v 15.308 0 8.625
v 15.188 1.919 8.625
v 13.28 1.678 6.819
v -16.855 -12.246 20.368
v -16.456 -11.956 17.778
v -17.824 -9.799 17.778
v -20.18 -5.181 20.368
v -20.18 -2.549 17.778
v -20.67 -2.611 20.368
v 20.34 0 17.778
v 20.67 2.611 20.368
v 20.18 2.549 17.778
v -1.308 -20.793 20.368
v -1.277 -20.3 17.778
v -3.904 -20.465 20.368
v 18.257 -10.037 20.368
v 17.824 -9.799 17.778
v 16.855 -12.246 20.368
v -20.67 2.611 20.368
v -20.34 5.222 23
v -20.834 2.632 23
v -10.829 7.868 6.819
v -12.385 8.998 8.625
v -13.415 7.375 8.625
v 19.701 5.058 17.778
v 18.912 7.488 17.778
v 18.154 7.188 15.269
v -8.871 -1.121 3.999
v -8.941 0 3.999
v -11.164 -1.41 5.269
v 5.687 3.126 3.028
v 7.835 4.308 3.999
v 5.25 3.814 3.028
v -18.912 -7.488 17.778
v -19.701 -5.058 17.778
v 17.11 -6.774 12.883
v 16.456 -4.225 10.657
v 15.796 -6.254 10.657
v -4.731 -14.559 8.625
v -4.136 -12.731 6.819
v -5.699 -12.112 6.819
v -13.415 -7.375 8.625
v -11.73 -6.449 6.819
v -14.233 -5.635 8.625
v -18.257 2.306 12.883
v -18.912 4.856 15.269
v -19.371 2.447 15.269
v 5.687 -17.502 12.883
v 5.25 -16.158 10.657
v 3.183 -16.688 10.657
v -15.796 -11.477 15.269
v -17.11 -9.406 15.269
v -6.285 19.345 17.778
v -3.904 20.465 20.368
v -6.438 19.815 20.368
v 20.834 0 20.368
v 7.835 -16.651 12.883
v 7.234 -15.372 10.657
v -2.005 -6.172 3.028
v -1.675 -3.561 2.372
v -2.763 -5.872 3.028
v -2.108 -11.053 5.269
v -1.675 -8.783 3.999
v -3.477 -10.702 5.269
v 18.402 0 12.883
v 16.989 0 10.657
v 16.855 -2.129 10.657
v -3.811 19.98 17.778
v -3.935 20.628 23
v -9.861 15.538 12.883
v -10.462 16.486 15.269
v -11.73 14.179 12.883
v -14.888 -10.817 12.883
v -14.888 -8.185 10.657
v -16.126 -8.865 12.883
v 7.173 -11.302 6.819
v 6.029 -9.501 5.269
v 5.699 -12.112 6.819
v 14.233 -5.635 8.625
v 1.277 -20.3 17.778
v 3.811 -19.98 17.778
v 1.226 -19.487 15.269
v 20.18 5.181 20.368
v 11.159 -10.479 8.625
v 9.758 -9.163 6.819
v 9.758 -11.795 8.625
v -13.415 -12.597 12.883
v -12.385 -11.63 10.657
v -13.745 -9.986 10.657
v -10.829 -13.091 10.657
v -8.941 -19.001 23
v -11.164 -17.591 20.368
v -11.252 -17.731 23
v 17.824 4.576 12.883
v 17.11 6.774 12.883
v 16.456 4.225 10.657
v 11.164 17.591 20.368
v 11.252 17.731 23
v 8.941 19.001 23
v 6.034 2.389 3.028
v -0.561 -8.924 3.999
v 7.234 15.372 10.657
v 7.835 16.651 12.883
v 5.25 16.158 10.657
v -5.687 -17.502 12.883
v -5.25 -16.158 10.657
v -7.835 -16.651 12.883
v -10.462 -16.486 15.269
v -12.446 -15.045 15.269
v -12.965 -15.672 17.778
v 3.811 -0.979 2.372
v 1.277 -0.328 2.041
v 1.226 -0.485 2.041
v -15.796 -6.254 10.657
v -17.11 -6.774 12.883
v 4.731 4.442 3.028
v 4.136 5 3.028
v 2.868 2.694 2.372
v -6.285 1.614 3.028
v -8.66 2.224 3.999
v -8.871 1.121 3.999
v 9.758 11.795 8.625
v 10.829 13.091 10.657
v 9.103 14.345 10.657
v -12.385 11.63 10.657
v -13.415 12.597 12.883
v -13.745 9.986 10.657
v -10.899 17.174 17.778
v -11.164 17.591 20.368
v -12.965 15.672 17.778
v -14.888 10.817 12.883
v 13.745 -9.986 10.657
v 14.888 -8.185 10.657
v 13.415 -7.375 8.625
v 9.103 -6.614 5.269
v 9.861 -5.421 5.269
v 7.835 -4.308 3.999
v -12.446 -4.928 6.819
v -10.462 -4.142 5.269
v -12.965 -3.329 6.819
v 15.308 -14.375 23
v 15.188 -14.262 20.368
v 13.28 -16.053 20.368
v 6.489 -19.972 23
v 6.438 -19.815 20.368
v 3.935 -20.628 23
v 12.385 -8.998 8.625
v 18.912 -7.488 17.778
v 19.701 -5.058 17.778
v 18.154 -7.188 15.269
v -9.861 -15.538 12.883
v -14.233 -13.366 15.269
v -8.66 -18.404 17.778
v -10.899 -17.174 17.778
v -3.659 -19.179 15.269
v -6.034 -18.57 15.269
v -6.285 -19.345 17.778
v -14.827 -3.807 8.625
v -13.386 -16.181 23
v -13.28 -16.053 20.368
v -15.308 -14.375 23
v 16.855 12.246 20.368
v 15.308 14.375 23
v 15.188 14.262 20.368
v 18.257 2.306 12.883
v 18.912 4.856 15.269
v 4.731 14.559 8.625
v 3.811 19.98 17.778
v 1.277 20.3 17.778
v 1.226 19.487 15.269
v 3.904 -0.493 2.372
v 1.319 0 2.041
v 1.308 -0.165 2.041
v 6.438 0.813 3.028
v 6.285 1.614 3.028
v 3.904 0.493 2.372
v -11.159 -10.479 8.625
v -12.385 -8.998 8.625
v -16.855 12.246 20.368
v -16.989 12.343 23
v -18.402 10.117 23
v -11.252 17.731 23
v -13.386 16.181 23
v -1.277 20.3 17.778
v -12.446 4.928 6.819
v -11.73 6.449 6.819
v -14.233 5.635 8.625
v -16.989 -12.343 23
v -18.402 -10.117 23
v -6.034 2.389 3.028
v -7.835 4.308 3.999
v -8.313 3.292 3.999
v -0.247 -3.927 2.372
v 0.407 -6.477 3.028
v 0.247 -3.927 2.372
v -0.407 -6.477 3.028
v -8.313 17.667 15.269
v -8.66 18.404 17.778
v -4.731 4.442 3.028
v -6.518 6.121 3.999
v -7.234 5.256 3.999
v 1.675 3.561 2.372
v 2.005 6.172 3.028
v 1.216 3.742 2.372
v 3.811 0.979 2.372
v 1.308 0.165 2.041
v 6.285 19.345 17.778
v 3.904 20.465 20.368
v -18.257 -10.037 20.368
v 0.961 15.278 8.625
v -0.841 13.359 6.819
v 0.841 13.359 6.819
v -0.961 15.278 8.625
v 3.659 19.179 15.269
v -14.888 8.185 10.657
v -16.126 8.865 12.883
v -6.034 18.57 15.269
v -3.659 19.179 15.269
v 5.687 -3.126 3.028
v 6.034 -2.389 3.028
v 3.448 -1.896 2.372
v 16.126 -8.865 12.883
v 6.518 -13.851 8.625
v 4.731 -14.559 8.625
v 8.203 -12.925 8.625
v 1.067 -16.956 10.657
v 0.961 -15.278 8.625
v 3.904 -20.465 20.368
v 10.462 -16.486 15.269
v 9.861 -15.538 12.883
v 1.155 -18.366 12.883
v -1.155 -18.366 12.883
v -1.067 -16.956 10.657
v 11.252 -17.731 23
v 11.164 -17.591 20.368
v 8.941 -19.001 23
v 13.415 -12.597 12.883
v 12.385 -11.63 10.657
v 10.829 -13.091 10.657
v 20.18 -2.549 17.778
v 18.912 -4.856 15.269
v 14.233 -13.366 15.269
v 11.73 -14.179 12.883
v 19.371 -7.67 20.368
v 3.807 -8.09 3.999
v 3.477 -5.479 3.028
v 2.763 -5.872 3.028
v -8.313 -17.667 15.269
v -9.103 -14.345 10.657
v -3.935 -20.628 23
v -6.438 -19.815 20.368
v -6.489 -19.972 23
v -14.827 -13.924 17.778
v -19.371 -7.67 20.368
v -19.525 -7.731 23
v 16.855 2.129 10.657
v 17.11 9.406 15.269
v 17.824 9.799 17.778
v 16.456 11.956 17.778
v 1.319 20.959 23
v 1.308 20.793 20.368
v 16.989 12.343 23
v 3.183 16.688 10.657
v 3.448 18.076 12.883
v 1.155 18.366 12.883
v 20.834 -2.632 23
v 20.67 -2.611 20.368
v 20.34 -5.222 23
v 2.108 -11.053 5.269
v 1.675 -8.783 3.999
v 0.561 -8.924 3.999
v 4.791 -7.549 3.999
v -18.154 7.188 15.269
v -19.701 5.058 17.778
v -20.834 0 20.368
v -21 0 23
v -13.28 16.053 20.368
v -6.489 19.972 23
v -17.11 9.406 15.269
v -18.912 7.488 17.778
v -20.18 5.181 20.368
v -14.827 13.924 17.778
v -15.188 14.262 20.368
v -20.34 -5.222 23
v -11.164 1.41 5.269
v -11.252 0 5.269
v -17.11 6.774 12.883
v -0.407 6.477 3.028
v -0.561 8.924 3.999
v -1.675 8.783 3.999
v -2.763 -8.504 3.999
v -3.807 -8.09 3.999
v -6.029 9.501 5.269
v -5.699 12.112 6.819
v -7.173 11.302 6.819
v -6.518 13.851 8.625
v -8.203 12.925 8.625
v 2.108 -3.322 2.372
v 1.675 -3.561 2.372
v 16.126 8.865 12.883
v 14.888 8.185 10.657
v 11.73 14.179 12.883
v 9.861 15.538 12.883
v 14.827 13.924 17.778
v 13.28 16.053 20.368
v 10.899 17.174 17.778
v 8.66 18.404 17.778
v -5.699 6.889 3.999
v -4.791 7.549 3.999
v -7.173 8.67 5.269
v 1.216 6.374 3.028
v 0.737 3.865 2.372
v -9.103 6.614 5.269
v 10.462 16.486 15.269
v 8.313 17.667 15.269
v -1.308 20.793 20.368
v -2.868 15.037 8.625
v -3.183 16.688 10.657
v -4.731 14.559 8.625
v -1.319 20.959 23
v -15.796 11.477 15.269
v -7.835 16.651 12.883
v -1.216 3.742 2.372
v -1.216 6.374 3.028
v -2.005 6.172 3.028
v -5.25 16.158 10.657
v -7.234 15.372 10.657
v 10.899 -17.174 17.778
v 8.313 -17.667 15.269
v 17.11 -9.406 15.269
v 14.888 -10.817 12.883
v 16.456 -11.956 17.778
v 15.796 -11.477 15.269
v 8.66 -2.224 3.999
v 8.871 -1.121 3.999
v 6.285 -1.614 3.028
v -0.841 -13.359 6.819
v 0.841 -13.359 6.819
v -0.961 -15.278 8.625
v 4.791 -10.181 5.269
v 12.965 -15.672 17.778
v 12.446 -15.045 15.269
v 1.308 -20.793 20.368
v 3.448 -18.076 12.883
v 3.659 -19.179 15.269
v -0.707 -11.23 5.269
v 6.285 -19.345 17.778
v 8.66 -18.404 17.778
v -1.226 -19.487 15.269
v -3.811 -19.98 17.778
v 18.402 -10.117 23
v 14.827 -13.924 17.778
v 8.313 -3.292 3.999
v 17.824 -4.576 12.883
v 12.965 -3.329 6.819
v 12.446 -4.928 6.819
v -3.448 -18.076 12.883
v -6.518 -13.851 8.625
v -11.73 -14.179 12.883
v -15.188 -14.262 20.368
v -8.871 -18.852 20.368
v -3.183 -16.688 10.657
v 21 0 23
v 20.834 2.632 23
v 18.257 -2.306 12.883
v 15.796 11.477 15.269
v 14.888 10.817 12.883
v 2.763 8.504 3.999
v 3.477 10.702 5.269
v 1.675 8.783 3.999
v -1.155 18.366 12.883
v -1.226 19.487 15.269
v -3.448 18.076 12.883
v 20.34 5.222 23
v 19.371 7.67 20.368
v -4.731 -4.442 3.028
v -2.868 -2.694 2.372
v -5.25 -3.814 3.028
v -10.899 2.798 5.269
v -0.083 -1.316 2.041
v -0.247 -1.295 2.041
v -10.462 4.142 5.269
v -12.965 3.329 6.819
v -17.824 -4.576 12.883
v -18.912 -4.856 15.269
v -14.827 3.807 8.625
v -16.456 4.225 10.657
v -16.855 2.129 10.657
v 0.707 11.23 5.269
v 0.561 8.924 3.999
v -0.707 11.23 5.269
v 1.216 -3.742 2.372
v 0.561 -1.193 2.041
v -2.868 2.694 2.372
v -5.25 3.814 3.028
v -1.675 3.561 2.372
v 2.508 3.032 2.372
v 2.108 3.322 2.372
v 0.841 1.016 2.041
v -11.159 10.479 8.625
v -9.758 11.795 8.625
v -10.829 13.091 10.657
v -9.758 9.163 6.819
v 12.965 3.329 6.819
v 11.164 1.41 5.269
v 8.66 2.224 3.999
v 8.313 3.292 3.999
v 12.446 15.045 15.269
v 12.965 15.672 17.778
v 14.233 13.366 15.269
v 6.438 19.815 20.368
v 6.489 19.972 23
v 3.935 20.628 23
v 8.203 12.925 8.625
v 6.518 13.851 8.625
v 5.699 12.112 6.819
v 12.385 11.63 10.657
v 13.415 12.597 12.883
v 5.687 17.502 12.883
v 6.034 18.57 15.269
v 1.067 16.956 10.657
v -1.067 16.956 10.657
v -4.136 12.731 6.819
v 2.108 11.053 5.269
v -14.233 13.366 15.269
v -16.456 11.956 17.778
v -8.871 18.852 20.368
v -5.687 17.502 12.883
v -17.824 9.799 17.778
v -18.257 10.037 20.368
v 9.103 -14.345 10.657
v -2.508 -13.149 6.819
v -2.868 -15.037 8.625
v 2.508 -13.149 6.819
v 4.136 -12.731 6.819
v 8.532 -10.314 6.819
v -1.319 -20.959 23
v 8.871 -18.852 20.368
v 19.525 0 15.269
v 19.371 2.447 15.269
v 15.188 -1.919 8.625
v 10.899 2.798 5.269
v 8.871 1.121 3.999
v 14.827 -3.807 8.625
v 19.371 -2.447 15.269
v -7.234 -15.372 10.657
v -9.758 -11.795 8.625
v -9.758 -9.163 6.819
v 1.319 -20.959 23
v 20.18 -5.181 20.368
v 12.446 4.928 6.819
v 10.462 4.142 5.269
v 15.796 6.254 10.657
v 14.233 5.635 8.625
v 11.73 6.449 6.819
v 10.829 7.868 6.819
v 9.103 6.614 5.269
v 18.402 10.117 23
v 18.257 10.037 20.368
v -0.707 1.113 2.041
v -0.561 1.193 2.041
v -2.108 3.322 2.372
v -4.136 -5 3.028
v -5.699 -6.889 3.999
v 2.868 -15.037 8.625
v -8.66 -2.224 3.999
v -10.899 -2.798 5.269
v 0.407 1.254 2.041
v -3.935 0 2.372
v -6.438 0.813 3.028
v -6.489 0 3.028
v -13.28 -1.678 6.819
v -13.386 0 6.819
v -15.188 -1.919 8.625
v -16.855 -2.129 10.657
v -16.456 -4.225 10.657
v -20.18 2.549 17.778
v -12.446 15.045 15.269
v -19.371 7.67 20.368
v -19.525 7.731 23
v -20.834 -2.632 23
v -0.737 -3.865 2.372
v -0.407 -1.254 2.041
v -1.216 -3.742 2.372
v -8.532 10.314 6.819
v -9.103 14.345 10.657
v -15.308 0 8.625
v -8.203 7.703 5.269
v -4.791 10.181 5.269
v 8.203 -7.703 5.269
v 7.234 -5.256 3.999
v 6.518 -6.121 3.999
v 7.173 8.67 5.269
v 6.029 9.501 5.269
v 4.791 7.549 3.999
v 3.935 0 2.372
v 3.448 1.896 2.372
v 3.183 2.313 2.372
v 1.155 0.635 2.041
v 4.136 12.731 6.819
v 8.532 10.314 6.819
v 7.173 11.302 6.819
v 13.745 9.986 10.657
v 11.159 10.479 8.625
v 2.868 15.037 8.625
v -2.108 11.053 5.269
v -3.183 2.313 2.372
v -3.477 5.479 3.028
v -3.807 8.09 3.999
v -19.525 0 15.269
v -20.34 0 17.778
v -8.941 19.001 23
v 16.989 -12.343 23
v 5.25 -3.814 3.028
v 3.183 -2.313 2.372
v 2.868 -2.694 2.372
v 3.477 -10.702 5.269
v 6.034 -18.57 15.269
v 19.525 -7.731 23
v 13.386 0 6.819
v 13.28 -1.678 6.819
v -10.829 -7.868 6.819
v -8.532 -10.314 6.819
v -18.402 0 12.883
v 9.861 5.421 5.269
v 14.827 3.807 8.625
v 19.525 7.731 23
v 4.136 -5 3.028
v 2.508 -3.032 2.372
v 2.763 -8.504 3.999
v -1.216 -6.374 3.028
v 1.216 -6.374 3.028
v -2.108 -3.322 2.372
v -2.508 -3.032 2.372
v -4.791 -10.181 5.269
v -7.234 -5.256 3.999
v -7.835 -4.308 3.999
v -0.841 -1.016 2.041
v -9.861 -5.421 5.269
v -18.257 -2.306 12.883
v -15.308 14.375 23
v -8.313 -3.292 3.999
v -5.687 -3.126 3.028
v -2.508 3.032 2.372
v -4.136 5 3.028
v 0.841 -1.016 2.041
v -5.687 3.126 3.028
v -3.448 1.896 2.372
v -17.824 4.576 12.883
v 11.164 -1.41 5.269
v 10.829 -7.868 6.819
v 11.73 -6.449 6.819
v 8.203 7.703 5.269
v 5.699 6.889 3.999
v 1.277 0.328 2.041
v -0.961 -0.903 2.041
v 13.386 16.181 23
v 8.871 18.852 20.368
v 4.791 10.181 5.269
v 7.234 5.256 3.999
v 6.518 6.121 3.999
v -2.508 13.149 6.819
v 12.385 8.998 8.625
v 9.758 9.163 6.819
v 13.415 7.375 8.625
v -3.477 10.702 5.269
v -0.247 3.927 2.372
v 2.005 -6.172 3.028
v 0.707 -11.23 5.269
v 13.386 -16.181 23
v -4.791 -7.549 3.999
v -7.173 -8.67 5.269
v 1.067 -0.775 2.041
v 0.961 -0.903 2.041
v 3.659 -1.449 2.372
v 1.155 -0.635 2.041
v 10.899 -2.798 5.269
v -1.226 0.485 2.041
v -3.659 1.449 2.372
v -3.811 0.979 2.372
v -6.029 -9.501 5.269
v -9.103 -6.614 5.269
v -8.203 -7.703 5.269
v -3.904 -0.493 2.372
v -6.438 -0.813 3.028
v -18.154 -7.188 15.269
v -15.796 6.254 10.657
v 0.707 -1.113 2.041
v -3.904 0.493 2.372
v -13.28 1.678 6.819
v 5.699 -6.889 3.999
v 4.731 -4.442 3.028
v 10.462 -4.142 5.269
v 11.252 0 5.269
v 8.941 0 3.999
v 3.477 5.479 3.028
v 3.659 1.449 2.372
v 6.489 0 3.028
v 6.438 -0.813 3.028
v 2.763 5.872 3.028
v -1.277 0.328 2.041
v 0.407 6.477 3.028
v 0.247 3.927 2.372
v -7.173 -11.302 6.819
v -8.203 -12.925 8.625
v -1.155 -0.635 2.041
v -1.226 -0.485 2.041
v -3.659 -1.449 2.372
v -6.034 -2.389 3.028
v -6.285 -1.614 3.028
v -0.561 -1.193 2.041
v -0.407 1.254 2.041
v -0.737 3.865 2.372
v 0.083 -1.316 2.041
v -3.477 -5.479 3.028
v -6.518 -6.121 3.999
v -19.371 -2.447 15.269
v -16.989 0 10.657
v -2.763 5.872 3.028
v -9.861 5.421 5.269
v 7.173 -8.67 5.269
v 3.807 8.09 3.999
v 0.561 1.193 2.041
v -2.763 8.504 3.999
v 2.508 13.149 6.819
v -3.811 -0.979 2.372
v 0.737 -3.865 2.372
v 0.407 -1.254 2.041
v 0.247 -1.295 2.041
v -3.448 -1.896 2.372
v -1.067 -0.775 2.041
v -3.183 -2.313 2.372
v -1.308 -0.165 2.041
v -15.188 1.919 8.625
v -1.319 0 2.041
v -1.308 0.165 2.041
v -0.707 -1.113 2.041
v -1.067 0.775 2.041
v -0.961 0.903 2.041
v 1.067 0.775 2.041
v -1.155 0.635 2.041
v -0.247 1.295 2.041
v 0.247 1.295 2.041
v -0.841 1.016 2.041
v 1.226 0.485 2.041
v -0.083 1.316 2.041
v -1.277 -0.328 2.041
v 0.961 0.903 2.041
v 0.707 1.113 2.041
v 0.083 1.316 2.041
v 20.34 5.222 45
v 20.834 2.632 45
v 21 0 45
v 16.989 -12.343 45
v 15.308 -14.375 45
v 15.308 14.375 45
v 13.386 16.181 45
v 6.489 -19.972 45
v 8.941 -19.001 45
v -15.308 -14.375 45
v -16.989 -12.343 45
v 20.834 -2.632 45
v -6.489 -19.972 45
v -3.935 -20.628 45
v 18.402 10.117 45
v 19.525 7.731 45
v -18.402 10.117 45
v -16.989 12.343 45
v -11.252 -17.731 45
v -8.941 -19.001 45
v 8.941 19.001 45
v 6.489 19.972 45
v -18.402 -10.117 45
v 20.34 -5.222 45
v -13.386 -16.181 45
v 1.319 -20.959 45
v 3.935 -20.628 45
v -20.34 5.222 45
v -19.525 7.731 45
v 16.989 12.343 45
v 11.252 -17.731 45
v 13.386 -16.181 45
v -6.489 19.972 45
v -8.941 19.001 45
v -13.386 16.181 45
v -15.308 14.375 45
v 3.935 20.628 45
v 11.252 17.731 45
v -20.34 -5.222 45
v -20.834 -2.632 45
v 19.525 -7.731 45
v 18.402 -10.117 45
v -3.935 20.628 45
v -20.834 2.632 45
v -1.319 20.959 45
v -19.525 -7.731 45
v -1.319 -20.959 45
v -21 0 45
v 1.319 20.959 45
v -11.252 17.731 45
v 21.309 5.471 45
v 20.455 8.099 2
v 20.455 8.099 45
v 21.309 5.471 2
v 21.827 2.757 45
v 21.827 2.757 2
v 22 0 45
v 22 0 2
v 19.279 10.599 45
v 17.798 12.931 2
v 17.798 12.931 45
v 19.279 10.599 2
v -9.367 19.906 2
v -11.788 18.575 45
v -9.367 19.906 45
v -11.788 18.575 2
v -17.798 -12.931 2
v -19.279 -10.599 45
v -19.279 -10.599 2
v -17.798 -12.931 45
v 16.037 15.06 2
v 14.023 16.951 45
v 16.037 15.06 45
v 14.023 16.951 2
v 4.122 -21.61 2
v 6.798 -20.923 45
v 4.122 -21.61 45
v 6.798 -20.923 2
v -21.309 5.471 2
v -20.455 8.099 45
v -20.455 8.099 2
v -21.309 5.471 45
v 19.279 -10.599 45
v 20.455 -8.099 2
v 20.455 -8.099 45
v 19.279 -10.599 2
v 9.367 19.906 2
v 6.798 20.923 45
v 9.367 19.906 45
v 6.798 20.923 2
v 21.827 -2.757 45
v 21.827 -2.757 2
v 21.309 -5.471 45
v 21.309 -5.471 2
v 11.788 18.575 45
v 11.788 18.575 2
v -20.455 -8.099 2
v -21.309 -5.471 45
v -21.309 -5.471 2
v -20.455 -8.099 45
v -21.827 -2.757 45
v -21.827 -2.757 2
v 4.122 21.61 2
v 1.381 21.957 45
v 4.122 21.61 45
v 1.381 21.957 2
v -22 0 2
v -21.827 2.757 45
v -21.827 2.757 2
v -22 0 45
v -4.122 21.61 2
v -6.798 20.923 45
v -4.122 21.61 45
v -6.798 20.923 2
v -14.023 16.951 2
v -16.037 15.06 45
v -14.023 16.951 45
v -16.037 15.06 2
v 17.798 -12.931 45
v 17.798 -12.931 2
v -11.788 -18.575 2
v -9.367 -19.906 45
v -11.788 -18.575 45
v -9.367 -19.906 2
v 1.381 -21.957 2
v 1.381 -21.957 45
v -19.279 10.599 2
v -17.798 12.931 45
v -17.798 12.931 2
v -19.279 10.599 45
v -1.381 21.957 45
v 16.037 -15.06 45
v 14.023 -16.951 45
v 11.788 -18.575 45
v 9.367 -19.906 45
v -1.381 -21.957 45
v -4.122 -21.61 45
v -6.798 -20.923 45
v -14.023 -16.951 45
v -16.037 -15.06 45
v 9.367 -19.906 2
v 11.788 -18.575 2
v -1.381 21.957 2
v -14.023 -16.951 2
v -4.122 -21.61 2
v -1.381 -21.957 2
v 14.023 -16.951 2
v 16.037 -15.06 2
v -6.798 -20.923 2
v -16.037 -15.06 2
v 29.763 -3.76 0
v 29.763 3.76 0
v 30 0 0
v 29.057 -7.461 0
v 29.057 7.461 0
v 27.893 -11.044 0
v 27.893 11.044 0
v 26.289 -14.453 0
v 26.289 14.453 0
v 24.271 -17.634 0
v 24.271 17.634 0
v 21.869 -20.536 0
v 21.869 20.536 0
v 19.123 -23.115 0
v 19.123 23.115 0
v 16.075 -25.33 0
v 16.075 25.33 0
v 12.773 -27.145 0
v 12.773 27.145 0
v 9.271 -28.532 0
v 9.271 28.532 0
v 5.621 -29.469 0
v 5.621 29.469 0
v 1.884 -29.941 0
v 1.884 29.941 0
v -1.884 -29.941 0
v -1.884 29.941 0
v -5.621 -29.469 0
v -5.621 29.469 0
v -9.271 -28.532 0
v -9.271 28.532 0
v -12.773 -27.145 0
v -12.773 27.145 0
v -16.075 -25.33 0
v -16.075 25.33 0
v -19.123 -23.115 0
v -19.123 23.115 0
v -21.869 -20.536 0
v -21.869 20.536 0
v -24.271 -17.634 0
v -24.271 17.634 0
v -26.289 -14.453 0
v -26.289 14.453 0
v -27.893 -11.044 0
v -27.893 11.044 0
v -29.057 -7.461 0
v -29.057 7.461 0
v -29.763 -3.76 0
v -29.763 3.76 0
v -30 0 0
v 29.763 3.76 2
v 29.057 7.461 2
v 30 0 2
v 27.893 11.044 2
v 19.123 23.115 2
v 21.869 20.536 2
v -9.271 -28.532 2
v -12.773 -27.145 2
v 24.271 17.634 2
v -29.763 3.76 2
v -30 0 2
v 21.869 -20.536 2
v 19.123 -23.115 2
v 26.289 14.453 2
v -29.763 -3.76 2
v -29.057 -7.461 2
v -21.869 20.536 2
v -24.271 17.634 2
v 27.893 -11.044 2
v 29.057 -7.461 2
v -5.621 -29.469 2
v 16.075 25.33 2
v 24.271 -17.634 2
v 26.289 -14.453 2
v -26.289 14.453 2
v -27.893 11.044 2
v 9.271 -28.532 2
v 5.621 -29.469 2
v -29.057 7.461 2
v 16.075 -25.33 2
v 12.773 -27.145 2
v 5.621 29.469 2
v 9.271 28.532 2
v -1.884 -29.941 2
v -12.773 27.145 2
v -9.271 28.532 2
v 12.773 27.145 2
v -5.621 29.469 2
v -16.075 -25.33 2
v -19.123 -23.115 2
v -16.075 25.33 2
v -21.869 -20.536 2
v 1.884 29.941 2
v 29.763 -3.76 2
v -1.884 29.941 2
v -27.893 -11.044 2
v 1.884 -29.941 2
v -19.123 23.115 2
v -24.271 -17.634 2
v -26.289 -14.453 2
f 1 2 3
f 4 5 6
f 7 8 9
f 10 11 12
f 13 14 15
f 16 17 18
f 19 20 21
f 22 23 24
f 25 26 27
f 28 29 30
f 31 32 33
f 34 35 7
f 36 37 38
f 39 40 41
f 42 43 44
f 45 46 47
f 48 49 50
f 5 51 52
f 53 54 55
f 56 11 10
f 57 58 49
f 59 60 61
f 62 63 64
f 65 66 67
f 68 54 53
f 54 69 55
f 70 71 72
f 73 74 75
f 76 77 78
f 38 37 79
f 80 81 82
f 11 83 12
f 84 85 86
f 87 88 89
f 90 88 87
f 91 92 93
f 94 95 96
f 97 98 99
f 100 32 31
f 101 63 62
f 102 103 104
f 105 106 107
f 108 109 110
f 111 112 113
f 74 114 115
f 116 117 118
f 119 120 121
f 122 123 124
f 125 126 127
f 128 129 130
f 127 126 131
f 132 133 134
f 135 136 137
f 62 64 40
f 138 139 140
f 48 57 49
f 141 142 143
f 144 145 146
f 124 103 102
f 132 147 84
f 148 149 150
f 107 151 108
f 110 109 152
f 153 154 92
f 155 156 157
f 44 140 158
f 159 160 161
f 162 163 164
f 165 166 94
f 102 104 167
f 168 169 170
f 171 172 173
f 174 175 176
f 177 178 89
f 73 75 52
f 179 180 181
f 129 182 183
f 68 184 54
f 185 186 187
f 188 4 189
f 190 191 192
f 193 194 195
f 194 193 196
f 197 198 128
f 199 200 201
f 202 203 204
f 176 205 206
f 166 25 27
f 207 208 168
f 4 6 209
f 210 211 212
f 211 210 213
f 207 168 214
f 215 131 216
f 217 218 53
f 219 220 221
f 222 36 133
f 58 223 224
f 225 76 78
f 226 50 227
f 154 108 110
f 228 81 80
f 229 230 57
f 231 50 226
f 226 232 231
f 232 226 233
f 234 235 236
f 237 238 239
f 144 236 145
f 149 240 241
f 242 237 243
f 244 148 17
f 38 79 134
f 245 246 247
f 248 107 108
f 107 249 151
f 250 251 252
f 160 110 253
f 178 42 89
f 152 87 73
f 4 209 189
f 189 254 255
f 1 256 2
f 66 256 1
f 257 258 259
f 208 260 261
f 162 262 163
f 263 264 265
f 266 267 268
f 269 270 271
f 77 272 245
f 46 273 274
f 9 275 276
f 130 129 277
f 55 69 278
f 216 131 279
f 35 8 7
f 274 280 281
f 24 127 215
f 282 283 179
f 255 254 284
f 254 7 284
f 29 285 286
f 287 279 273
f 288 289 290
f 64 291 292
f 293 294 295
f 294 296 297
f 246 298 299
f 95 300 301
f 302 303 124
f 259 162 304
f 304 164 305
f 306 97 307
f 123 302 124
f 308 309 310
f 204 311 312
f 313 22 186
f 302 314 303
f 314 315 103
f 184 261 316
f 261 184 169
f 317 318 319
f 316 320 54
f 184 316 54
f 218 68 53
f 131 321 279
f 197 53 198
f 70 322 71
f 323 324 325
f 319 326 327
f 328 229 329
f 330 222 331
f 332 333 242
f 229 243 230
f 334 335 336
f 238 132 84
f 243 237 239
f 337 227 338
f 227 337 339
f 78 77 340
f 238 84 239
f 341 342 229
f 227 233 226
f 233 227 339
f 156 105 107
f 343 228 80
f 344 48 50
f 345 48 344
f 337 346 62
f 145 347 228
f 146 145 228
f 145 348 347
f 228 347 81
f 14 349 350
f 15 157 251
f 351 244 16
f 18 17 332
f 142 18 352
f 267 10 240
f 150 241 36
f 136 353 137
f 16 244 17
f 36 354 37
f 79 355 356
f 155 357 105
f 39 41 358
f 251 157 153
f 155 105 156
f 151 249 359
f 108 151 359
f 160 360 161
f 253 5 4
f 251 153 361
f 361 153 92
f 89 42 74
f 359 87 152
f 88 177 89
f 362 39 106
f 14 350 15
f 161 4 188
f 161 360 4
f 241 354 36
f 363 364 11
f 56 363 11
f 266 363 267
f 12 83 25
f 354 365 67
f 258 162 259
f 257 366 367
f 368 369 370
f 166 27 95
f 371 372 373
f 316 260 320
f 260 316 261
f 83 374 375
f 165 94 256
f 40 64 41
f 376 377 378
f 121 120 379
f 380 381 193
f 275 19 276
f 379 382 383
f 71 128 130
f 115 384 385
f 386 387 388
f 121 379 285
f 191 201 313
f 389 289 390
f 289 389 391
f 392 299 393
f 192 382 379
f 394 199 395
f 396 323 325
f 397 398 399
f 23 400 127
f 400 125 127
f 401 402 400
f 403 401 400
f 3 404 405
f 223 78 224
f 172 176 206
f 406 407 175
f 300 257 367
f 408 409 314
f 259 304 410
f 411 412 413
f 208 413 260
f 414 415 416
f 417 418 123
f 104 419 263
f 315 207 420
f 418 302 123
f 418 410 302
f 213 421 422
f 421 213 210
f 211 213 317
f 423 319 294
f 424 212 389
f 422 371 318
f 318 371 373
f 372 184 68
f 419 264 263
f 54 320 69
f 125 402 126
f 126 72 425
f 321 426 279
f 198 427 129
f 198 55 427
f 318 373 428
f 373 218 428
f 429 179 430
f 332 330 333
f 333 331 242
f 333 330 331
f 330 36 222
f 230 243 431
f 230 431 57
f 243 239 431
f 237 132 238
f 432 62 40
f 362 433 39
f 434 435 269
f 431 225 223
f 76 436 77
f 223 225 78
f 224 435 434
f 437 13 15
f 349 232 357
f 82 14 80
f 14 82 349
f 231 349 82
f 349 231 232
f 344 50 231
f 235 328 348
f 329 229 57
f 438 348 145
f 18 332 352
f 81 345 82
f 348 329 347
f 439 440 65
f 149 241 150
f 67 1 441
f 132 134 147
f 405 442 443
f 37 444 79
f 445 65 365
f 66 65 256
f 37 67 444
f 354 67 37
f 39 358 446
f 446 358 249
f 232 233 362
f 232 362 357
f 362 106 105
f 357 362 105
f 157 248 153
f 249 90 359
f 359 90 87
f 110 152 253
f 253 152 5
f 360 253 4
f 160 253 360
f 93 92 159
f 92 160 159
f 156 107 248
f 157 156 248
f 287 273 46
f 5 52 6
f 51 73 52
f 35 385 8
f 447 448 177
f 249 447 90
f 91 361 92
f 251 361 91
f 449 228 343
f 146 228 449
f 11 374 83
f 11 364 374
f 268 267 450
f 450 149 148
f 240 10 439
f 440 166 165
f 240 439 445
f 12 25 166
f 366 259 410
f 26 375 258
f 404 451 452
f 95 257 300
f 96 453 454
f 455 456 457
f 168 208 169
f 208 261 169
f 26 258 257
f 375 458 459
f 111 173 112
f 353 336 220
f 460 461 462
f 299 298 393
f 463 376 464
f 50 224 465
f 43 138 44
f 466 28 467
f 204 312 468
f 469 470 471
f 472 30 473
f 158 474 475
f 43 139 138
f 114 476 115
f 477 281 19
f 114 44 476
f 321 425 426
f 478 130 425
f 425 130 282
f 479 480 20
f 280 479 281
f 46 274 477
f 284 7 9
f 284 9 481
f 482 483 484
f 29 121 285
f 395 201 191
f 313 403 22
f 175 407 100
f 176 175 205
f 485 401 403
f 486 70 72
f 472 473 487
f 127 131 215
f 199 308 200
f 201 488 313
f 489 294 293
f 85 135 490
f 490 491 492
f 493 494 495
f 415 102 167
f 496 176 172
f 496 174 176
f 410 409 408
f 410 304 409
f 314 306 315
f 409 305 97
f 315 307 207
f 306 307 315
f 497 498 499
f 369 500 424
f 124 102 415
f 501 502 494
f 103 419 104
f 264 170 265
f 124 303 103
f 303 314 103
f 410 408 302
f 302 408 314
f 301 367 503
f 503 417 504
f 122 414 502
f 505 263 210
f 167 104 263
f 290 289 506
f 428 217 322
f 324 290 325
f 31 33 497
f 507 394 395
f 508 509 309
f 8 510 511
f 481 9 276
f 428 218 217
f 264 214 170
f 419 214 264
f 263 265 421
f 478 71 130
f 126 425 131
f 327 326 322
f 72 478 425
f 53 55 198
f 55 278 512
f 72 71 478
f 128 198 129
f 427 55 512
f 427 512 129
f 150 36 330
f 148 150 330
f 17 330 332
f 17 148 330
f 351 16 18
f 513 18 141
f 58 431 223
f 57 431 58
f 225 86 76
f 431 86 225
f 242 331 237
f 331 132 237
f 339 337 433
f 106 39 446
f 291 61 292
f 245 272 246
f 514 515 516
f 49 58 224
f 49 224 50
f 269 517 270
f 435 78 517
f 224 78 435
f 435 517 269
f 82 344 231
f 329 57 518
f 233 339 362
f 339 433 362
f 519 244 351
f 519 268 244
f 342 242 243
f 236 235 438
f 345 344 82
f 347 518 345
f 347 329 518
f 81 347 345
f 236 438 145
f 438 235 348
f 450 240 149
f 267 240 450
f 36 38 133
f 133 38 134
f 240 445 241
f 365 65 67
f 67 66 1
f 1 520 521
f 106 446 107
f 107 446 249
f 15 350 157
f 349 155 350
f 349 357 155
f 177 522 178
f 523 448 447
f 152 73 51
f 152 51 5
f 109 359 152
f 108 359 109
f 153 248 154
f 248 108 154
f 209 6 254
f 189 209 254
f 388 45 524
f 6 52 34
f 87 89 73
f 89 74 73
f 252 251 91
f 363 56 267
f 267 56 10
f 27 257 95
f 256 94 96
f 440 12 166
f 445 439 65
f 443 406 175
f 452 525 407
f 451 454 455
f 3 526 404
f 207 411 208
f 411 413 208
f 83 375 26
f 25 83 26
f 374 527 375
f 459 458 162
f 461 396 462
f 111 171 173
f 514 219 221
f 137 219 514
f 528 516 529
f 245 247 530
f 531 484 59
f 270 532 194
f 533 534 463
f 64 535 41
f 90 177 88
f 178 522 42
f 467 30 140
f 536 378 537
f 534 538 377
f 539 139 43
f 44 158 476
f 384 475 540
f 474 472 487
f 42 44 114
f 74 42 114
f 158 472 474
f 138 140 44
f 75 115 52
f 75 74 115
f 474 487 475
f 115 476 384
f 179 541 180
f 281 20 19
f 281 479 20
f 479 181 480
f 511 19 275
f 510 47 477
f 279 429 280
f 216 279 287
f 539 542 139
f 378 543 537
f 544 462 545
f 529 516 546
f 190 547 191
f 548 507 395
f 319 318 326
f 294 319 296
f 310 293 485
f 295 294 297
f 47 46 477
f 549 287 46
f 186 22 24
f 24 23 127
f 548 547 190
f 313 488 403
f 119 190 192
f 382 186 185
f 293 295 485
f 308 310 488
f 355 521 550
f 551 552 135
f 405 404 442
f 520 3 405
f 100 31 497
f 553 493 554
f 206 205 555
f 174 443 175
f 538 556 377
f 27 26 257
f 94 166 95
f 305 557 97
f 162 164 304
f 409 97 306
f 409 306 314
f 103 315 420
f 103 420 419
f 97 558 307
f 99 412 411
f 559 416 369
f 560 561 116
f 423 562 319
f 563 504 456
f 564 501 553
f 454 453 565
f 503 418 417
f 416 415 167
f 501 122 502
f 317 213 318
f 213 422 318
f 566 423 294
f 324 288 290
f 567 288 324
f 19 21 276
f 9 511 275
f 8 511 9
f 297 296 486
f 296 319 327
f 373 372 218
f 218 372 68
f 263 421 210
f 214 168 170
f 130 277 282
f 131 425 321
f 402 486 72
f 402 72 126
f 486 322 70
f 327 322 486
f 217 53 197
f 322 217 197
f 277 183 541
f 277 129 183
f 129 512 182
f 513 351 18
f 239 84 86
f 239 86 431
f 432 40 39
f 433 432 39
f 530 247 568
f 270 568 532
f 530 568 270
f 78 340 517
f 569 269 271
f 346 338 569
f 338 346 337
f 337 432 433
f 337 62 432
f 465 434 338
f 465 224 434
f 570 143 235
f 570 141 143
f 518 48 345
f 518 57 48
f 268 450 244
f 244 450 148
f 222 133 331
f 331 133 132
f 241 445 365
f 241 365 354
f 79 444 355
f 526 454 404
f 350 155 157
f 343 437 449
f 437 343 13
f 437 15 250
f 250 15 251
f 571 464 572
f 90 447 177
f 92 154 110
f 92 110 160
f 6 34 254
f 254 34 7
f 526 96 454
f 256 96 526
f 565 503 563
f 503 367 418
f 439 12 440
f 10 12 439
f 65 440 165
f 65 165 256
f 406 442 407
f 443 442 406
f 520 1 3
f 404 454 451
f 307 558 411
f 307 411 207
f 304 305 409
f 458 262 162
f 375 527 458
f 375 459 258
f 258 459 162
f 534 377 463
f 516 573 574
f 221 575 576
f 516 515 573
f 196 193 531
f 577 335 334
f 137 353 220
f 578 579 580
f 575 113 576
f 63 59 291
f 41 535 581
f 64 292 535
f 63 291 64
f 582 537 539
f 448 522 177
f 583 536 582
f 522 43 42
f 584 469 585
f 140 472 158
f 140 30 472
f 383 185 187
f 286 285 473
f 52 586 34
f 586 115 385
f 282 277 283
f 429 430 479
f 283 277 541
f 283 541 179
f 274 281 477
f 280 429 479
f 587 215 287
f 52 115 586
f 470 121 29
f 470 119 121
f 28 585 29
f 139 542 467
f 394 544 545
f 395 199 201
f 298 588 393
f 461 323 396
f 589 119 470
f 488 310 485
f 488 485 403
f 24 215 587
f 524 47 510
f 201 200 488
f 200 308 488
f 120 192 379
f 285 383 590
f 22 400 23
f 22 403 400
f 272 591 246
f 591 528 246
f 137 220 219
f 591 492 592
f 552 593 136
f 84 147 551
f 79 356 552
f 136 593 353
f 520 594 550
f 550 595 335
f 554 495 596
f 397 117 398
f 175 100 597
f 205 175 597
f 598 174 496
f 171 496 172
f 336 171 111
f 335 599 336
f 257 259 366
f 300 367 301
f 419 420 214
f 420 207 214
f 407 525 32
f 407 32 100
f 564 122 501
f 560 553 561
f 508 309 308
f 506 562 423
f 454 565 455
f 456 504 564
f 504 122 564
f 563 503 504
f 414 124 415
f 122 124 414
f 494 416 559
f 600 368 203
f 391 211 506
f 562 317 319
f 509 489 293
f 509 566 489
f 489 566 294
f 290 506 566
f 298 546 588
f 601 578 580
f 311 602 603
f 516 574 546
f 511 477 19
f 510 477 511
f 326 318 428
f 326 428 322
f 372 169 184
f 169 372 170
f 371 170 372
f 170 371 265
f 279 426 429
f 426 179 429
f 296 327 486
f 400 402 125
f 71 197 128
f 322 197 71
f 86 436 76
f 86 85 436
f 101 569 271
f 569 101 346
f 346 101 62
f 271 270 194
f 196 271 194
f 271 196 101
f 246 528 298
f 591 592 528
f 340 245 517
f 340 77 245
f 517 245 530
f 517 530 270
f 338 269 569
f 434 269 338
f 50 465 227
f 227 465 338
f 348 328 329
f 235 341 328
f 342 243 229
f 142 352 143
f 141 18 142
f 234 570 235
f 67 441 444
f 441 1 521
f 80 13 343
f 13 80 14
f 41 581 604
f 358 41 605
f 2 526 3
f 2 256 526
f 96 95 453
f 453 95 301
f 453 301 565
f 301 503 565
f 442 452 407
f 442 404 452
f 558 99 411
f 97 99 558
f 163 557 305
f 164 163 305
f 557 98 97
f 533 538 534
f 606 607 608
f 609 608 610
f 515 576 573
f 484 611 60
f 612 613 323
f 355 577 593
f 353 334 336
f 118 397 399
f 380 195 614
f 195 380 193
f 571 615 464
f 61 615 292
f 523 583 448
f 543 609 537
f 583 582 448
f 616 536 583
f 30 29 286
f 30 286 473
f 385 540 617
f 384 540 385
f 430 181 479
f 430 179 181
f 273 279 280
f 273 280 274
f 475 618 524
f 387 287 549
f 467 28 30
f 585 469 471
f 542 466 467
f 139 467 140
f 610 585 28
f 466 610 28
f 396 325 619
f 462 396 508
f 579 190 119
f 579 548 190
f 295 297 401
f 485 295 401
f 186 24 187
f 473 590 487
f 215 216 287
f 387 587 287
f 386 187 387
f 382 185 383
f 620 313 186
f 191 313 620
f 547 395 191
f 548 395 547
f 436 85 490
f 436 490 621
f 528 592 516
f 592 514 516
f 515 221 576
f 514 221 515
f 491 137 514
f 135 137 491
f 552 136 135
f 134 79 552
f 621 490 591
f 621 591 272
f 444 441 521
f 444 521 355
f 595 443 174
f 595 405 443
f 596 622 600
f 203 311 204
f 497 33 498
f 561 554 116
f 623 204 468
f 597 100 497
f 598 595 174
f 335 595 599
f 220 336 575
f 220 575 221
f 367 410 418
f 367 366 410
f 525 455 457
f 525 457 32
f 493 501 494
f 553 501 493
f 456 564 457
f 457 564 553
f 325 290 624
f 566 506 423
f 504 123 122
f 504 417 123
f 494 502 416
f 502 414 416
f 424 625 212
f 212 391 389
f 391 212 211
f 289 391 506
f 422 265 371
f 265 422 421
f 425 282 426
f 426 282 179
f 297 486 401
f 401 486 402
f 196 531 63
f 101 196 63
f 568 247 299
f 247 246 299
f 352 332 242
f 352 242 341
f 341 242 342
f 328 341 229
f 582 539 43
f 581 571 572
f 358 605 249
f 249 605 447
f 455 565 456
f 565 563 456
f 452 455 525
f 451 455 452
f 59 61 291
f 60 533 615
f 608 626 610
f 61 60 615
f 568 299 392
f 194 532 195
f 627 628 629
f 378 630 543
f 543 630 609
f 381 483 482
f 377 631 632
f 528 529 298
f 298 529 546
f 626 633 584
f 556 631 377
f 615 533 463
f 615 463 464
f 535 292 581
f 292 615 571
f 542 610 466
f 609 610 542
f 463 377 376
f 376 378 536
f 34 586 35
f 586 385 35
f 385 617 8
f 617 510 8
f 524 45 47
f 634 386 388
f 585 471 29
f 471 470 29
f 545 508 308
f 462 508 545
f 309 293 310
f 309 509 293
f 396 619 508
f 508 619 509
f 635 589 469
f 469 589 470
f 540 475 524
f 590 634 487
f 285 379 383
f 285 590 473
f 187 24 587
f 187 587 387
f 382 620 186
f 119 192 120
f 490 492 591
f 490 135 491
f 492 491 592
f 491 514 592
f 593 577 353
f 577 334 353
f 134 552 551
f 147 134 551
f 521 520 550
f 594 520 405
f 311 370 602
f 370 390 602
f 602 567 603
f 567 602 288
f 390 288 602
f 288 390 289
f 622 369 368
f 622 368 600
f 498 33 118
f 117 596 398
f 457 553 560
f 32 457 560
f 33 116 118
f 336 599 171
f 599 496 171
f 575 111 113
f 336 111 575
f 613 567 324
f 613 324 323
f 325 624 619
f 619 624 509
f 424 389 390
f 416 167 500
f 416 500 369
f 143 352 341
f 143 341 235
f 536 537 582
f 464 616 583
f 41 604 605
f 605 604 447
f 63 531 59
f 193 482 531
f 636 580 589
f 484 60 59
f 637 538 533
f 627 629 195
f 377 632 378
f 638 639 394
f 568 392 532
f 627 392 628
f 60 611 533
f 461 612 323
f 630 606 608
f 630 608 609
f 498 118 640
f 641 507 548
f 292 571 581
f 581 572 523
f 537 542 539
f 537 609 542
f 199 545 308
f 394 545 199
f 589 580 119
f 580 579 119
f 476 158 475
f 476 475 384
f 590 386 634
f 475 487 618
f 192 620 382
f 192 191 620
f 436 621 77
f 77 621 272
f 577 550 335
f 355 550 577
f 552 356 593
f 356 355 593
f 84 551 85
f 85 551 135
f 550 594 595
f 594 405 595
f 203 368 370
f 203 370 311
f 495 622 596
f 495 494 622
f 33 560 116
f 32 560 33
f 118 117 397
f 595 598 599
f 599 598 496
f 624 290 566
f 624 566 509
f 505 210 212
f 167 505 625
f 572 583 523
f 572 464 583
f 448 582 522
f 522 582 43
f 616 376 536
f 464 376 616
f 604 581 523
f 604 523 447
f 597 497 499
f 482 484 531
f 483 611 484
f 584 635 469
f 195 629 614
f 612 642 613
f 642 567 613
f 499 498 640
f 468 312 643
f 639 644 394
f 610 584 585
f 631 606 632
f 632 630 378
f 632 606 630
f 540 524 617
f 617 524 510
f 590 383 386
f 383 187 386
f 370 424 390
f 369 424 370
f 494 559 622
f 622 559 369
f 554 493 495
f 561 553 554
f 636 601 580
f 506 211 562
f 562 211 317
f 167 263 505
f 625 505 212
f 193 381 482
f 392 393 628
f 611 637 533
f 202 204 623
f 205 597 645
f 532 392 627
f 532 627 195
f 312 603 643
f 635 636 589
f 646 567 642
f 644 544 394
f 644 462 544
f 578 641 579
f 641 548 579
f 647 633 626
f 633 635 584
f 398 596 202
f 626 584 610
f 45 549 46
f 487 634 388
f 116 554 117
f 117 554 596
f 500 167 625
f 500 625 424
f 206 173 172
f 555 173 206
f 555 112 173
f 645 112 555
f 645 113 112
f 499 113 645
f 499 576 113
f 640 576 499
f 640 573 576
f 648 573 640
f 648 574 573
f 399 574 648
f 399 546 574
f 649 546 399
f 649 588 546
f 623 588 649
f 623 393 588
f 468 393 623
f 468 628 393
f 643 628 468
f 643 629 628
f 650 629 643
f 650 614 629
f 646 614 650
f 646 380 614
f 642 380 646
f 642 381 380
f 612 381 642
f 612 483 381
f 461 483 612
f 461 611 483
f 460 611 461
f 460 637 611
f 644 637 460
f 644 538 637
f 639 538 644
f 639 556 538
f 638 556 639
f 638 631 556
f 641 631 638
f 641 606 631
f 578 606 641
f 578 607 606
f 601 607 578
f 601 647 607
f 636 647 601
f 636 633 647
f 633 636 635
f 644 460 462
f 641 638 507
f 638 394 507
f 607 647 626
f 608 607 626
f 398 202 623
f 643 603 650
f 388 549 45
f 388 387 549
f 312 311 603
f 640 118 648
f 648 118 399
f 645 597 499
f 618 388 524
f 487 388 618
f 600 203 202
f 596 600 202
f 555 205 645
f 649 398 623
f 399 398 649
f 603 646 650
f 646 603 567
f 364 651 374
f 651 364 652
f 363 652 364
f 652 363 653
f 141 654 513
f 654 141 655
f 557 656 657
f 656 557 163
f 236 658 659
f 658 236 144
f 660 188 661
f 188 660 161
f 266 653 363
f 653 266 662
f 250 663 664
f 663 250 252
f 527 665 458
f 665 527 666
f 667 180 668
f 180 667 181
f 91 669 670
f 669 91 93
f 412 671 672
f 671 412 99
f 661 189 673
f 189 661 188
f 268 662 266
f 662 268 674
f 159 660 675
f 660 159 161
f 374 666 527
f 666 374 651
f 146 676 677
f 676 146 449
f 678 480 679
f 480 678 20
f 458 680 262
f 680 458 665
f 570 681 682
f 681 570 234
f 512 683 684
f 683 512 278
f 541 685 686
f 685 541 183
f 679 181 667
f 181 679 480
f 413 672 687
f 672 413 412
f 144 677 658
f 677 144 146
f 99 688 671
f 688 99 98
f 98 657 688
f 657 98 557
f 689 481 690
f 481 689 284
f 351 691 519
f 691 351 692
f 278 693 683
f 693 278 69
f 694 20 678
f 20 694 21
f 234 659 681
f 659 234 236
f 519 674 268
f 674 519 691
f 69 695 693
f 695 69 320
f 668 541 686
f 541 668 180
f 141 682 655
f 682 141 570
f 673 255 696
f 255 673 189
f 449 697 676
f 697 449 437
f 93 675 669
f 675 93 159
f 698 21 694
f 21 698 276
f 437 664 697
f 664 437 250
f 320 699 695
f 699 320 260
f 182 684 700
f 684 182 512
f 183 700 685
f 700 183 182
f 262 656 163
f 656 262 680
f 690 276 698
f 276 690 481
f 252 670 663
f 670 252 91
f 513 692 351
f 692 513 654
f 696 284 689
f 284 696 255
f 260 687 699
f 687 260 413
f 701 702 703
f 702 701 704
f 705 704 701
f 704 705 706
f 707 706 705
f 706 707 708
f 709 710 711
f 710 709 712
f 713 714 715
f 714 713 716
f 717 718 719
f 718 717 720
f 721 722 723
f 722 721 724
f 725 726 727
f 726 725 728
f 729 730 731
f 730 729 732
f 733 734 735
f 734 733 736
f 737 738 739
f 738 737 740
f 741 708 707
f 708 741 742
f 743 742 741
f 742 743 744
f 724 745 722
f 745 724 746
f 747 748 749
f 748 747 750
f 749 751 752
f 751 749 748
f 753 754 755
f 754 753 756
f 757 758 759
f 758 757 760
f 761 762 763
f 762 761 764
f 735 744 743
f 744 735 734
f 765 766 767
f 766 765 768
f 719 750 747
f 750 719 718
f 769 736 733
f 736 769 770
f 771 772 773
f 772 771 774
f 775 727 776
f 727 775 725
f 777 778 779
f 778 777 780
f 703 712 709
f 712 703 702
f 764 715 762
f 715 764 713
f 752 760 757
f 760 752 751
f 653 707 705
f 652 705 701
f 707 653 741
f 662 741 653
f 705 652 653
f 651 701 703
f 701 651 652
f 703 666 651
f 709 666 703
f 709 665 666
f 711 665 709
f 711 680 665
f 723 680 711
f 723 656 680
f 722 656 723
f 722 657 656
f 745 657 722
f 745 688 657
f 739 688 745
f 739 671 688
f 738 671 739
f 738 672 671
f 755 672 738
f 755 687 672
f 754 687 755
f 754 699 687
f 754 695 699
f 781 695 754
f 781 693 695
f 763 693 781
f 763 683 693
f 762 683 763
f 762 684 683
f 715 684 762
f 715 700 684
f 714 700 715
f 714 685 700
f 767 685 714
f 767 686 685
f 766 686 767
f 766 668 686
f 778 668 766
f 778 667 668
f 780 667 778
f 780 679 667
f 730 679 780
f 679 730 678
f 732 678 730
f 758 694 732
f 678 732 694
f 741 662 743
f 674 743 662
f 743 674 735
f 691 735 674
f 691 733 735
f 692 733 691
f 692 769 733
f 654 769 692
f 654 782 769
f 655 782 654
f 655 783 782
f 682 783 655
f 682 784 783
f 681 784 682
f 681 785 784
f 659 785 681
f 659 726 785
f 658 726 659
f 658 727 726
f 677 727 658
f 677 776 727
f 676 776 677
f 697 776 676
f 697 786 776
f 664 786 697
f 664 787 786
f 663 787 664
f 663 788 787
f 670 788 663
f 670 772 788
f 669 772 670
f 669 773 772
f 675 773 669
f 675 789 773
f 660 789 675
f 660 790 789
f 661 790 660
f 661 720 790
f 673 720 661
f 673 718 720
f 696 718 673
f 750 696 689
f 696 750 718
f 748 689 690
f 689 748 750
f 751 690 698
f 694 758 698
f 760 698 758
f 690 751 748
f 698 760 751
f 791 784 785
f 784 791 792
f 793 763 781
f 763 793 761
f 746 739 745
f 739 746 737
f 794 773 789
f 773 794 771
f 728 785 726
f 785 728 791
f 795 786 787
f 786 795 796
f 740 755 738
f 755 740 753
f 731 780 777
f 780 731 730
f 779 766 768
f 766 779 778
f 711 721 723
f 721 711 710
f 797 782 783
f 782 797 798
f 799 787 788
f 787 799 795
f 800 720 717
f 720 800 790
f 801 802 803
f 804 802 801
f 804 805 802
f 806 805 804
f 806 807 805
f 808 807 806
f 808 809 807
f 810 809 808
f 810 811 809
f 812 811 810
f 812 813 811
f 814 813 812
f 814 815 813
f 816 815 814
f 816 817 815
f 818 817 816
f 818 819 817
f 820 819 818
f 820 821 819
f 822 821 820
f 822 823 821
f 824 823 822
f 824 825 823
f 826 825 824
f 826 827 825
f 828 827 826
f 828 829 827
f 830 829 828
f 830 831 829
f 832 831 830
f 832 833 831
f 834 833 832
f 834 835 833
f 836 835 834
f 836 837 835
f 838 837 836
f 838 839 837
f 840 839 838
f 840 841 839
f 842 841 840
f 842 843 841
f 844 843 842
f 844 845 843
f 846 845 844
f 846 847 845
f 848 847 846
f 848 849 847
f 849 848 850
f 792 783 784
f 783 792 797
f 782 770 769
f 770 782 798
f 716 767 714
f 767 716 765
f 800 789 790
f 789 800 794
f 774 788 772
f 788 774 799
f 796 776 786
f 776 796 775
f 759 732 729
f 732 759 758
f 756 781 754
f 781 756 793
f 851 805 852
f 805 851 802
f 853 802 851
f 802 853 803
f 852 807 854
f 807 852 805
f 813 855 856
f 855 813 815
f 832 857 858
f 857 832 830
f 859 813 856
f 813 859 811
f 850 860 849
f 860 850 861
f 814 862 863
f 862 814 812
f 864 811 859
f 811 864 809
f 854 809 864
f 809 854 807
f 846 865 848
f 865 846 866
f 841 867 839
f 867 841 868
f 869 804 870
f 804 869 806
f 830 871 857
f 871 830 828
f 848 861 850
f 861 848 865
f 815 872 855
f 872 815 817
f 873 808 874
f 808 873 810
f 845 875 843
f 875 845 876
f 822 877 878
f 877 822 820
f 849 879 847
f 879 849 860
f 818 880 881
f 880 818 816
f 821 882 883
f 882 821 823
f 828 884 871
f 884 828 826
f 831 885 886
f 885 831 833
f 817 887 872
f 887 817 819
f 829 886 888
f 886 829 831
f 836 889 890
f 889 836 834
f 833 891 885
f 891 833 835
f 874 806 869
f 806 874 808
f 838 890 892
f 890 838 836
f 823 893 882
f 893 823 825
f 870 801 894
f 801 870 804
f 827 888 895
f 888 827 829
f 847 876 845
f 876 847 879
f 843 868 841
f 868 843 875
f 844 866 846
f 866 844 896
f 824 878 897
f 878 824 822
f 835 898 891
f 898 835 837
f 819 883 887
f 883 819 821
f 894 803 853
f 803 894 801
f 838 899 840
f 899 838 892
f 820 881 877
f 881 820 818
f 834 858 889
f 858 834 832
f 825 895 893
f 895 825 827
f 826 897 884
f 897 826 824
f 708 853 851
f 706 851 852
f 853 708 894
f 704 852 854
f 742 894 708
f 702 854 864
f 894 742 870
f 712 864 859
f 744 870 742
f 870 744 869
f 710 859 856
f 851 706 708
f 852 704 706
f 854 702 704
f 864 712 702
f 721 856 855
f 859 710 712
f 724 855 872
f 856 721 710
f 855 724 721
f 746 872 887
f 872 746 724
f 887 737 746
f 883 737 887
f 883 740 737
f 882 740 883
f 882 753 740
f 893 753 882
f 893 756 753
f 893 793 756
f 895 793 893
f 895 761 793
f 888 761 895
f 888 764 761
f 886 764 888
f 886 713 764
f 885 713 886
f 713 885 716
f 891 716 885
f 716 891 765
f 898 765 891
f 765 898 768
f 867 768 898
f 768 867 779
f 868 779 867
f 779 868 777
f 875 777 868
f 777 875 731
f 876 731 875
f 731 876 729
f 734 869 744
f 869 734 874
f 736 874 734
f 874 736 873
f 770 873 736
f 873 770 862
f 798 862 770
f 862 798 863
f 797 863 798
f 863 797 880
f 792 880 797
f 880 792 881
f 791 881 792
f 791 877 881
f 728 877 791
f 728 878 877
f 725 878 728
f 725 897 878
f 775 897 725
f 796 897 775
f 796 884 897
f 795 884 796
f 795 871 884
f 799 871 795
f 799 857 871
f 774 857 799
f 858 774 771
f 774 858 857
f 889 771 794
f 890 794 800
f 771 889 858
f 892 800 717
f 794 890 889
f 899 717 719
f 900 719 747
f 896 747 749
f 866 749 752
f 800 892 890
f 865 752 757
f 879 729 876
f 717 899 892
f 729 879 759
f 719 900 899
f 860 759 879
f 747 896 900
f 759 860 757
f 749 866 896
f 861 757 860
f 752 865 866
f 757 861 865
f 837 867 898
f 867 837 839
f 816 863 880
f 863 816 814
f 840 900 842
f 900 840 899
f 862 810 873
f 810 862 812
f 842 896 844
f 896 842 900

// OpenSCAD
/** *** ***** ******* ***********
//
// Deodorant Roll-On Upside-Down Stand
// Version 2 - 03.01.2018 
// CC-BY-NC-SA January 2018 by ohuf@Thingiverse
//
// Cylindrical version: www.thingiverse.com/thing:2743048
// Cubic version: www.thingiverse.com/thing:2743147
// Customizer: www.thingiverse.com/thing:2743081


(Deutscher Text: Siehe unten...)

Do you know those deodorant bottles with a spherical cap?
They are a perfect example for form __not__ following function!

Having them upright is a terrible waste of time in the morning, especially when they're half-empty - or half-full, depending on your view on that kind of things: you have to wait till the fluid on the inside hat reached the roll-on ball ....

So I designed this simple upside-down stand.
There are two main designs: a cubic or a cylindrical body. Those can be mixed-and-matched wit a square or circular base plate.
There is also a purist cubic version online: []()


Enjoy, have fun remixing it and let me know when you've made one, and what it looks like!


-- --- ----- ------- -----------
[DE:]

Ich nutze diese Deo-Roll-On's, die einen halbkugelförmigen Deckel haben. Das Design der Verpackung ist ein perfektes Gegenbeispiel zu "Form folgt Funktion": Sobald die Flasche nur noch halbleer (oder halbvoll) ist, dauert es eine gefühlte Ewigkeit, bis der Inhalt an der Kugel angekommen ist - vor allem morgens, wenn der Kopf noch nicht so schnell ist ;-)
Durch den runden Deckel lässt sich die Fasche aber nicht kopfüber lagern.

Ich habe diesen einfachen Ständer entworfen, mit dem sich Deo-Roll-On's kopfüber lagern lassen.
Der Customizer erlaubt die Auswahl zwischen zwei prinzipiellen Designs: kubisch oder zylindrisch. Diese beiden lassen sich wahlweise mit einer kreisförmigen oder einer quadratischen Bodenplatte kombinieren.

Wenn du einen hergestellt hast, lass es mich über "I Made One" wissen!

Konstruiert in OpenSCAD: viel Spaß beim Remixen!

// 
// License: CC-BY-NC-SA 03.01.2018 oli@huf.org
// read all about it here: http://creativecommons.org/licenses/by-nc-sa/4.0/
//
** *** ***** ******* ***********/


// - Diameter of the circular bottle. Same as the diameter of the spherical cap
dia_in=42;

//- Vertical size of the stand
height=45;

// - Form of the stand
base_type="circular";	//[circular, cubic]
//base_type="cubic";

// - Form of the base plate
foot_type="circular";		//[circular, cubic, none]
//plate_type="cubic";	
//plate_type="none";	

// - Additional size of the base plate
foot_size=16;

/*[Hidden]*/
$fn=50;
mat=2;
dt1=0.001;
dt2=2*dt1;

dia_out=dia_in+mat;
base_width=dia_out+foot_size;
//dia_out=height;	// "purist" cubic version :-) - print with plate_type=none

difference(){
	if(base_type=="circular"){
		cylinder(d=dia_out, h=height);
	} else {
		translate([-dia_out/2, -dia_out/2, 0])
		cube([dia_out, dia_out, height]);
	}
	union(){
		translate([0, 0, mat+dia_in/2])
			sphere(d=dia_in);
		translate([0, 0, mat+dia_in/2])
			cylinder(d=dia_in, h=height+dt1);
	}
}

if(foot_type=="circular"){
	cylinder(d=base_width, h=mat);
} else if(foot_type=="cubic"){
	translate([-base_width/2, -base_width/2, 0])
	cube([base_width, base_width, mat]);
}
